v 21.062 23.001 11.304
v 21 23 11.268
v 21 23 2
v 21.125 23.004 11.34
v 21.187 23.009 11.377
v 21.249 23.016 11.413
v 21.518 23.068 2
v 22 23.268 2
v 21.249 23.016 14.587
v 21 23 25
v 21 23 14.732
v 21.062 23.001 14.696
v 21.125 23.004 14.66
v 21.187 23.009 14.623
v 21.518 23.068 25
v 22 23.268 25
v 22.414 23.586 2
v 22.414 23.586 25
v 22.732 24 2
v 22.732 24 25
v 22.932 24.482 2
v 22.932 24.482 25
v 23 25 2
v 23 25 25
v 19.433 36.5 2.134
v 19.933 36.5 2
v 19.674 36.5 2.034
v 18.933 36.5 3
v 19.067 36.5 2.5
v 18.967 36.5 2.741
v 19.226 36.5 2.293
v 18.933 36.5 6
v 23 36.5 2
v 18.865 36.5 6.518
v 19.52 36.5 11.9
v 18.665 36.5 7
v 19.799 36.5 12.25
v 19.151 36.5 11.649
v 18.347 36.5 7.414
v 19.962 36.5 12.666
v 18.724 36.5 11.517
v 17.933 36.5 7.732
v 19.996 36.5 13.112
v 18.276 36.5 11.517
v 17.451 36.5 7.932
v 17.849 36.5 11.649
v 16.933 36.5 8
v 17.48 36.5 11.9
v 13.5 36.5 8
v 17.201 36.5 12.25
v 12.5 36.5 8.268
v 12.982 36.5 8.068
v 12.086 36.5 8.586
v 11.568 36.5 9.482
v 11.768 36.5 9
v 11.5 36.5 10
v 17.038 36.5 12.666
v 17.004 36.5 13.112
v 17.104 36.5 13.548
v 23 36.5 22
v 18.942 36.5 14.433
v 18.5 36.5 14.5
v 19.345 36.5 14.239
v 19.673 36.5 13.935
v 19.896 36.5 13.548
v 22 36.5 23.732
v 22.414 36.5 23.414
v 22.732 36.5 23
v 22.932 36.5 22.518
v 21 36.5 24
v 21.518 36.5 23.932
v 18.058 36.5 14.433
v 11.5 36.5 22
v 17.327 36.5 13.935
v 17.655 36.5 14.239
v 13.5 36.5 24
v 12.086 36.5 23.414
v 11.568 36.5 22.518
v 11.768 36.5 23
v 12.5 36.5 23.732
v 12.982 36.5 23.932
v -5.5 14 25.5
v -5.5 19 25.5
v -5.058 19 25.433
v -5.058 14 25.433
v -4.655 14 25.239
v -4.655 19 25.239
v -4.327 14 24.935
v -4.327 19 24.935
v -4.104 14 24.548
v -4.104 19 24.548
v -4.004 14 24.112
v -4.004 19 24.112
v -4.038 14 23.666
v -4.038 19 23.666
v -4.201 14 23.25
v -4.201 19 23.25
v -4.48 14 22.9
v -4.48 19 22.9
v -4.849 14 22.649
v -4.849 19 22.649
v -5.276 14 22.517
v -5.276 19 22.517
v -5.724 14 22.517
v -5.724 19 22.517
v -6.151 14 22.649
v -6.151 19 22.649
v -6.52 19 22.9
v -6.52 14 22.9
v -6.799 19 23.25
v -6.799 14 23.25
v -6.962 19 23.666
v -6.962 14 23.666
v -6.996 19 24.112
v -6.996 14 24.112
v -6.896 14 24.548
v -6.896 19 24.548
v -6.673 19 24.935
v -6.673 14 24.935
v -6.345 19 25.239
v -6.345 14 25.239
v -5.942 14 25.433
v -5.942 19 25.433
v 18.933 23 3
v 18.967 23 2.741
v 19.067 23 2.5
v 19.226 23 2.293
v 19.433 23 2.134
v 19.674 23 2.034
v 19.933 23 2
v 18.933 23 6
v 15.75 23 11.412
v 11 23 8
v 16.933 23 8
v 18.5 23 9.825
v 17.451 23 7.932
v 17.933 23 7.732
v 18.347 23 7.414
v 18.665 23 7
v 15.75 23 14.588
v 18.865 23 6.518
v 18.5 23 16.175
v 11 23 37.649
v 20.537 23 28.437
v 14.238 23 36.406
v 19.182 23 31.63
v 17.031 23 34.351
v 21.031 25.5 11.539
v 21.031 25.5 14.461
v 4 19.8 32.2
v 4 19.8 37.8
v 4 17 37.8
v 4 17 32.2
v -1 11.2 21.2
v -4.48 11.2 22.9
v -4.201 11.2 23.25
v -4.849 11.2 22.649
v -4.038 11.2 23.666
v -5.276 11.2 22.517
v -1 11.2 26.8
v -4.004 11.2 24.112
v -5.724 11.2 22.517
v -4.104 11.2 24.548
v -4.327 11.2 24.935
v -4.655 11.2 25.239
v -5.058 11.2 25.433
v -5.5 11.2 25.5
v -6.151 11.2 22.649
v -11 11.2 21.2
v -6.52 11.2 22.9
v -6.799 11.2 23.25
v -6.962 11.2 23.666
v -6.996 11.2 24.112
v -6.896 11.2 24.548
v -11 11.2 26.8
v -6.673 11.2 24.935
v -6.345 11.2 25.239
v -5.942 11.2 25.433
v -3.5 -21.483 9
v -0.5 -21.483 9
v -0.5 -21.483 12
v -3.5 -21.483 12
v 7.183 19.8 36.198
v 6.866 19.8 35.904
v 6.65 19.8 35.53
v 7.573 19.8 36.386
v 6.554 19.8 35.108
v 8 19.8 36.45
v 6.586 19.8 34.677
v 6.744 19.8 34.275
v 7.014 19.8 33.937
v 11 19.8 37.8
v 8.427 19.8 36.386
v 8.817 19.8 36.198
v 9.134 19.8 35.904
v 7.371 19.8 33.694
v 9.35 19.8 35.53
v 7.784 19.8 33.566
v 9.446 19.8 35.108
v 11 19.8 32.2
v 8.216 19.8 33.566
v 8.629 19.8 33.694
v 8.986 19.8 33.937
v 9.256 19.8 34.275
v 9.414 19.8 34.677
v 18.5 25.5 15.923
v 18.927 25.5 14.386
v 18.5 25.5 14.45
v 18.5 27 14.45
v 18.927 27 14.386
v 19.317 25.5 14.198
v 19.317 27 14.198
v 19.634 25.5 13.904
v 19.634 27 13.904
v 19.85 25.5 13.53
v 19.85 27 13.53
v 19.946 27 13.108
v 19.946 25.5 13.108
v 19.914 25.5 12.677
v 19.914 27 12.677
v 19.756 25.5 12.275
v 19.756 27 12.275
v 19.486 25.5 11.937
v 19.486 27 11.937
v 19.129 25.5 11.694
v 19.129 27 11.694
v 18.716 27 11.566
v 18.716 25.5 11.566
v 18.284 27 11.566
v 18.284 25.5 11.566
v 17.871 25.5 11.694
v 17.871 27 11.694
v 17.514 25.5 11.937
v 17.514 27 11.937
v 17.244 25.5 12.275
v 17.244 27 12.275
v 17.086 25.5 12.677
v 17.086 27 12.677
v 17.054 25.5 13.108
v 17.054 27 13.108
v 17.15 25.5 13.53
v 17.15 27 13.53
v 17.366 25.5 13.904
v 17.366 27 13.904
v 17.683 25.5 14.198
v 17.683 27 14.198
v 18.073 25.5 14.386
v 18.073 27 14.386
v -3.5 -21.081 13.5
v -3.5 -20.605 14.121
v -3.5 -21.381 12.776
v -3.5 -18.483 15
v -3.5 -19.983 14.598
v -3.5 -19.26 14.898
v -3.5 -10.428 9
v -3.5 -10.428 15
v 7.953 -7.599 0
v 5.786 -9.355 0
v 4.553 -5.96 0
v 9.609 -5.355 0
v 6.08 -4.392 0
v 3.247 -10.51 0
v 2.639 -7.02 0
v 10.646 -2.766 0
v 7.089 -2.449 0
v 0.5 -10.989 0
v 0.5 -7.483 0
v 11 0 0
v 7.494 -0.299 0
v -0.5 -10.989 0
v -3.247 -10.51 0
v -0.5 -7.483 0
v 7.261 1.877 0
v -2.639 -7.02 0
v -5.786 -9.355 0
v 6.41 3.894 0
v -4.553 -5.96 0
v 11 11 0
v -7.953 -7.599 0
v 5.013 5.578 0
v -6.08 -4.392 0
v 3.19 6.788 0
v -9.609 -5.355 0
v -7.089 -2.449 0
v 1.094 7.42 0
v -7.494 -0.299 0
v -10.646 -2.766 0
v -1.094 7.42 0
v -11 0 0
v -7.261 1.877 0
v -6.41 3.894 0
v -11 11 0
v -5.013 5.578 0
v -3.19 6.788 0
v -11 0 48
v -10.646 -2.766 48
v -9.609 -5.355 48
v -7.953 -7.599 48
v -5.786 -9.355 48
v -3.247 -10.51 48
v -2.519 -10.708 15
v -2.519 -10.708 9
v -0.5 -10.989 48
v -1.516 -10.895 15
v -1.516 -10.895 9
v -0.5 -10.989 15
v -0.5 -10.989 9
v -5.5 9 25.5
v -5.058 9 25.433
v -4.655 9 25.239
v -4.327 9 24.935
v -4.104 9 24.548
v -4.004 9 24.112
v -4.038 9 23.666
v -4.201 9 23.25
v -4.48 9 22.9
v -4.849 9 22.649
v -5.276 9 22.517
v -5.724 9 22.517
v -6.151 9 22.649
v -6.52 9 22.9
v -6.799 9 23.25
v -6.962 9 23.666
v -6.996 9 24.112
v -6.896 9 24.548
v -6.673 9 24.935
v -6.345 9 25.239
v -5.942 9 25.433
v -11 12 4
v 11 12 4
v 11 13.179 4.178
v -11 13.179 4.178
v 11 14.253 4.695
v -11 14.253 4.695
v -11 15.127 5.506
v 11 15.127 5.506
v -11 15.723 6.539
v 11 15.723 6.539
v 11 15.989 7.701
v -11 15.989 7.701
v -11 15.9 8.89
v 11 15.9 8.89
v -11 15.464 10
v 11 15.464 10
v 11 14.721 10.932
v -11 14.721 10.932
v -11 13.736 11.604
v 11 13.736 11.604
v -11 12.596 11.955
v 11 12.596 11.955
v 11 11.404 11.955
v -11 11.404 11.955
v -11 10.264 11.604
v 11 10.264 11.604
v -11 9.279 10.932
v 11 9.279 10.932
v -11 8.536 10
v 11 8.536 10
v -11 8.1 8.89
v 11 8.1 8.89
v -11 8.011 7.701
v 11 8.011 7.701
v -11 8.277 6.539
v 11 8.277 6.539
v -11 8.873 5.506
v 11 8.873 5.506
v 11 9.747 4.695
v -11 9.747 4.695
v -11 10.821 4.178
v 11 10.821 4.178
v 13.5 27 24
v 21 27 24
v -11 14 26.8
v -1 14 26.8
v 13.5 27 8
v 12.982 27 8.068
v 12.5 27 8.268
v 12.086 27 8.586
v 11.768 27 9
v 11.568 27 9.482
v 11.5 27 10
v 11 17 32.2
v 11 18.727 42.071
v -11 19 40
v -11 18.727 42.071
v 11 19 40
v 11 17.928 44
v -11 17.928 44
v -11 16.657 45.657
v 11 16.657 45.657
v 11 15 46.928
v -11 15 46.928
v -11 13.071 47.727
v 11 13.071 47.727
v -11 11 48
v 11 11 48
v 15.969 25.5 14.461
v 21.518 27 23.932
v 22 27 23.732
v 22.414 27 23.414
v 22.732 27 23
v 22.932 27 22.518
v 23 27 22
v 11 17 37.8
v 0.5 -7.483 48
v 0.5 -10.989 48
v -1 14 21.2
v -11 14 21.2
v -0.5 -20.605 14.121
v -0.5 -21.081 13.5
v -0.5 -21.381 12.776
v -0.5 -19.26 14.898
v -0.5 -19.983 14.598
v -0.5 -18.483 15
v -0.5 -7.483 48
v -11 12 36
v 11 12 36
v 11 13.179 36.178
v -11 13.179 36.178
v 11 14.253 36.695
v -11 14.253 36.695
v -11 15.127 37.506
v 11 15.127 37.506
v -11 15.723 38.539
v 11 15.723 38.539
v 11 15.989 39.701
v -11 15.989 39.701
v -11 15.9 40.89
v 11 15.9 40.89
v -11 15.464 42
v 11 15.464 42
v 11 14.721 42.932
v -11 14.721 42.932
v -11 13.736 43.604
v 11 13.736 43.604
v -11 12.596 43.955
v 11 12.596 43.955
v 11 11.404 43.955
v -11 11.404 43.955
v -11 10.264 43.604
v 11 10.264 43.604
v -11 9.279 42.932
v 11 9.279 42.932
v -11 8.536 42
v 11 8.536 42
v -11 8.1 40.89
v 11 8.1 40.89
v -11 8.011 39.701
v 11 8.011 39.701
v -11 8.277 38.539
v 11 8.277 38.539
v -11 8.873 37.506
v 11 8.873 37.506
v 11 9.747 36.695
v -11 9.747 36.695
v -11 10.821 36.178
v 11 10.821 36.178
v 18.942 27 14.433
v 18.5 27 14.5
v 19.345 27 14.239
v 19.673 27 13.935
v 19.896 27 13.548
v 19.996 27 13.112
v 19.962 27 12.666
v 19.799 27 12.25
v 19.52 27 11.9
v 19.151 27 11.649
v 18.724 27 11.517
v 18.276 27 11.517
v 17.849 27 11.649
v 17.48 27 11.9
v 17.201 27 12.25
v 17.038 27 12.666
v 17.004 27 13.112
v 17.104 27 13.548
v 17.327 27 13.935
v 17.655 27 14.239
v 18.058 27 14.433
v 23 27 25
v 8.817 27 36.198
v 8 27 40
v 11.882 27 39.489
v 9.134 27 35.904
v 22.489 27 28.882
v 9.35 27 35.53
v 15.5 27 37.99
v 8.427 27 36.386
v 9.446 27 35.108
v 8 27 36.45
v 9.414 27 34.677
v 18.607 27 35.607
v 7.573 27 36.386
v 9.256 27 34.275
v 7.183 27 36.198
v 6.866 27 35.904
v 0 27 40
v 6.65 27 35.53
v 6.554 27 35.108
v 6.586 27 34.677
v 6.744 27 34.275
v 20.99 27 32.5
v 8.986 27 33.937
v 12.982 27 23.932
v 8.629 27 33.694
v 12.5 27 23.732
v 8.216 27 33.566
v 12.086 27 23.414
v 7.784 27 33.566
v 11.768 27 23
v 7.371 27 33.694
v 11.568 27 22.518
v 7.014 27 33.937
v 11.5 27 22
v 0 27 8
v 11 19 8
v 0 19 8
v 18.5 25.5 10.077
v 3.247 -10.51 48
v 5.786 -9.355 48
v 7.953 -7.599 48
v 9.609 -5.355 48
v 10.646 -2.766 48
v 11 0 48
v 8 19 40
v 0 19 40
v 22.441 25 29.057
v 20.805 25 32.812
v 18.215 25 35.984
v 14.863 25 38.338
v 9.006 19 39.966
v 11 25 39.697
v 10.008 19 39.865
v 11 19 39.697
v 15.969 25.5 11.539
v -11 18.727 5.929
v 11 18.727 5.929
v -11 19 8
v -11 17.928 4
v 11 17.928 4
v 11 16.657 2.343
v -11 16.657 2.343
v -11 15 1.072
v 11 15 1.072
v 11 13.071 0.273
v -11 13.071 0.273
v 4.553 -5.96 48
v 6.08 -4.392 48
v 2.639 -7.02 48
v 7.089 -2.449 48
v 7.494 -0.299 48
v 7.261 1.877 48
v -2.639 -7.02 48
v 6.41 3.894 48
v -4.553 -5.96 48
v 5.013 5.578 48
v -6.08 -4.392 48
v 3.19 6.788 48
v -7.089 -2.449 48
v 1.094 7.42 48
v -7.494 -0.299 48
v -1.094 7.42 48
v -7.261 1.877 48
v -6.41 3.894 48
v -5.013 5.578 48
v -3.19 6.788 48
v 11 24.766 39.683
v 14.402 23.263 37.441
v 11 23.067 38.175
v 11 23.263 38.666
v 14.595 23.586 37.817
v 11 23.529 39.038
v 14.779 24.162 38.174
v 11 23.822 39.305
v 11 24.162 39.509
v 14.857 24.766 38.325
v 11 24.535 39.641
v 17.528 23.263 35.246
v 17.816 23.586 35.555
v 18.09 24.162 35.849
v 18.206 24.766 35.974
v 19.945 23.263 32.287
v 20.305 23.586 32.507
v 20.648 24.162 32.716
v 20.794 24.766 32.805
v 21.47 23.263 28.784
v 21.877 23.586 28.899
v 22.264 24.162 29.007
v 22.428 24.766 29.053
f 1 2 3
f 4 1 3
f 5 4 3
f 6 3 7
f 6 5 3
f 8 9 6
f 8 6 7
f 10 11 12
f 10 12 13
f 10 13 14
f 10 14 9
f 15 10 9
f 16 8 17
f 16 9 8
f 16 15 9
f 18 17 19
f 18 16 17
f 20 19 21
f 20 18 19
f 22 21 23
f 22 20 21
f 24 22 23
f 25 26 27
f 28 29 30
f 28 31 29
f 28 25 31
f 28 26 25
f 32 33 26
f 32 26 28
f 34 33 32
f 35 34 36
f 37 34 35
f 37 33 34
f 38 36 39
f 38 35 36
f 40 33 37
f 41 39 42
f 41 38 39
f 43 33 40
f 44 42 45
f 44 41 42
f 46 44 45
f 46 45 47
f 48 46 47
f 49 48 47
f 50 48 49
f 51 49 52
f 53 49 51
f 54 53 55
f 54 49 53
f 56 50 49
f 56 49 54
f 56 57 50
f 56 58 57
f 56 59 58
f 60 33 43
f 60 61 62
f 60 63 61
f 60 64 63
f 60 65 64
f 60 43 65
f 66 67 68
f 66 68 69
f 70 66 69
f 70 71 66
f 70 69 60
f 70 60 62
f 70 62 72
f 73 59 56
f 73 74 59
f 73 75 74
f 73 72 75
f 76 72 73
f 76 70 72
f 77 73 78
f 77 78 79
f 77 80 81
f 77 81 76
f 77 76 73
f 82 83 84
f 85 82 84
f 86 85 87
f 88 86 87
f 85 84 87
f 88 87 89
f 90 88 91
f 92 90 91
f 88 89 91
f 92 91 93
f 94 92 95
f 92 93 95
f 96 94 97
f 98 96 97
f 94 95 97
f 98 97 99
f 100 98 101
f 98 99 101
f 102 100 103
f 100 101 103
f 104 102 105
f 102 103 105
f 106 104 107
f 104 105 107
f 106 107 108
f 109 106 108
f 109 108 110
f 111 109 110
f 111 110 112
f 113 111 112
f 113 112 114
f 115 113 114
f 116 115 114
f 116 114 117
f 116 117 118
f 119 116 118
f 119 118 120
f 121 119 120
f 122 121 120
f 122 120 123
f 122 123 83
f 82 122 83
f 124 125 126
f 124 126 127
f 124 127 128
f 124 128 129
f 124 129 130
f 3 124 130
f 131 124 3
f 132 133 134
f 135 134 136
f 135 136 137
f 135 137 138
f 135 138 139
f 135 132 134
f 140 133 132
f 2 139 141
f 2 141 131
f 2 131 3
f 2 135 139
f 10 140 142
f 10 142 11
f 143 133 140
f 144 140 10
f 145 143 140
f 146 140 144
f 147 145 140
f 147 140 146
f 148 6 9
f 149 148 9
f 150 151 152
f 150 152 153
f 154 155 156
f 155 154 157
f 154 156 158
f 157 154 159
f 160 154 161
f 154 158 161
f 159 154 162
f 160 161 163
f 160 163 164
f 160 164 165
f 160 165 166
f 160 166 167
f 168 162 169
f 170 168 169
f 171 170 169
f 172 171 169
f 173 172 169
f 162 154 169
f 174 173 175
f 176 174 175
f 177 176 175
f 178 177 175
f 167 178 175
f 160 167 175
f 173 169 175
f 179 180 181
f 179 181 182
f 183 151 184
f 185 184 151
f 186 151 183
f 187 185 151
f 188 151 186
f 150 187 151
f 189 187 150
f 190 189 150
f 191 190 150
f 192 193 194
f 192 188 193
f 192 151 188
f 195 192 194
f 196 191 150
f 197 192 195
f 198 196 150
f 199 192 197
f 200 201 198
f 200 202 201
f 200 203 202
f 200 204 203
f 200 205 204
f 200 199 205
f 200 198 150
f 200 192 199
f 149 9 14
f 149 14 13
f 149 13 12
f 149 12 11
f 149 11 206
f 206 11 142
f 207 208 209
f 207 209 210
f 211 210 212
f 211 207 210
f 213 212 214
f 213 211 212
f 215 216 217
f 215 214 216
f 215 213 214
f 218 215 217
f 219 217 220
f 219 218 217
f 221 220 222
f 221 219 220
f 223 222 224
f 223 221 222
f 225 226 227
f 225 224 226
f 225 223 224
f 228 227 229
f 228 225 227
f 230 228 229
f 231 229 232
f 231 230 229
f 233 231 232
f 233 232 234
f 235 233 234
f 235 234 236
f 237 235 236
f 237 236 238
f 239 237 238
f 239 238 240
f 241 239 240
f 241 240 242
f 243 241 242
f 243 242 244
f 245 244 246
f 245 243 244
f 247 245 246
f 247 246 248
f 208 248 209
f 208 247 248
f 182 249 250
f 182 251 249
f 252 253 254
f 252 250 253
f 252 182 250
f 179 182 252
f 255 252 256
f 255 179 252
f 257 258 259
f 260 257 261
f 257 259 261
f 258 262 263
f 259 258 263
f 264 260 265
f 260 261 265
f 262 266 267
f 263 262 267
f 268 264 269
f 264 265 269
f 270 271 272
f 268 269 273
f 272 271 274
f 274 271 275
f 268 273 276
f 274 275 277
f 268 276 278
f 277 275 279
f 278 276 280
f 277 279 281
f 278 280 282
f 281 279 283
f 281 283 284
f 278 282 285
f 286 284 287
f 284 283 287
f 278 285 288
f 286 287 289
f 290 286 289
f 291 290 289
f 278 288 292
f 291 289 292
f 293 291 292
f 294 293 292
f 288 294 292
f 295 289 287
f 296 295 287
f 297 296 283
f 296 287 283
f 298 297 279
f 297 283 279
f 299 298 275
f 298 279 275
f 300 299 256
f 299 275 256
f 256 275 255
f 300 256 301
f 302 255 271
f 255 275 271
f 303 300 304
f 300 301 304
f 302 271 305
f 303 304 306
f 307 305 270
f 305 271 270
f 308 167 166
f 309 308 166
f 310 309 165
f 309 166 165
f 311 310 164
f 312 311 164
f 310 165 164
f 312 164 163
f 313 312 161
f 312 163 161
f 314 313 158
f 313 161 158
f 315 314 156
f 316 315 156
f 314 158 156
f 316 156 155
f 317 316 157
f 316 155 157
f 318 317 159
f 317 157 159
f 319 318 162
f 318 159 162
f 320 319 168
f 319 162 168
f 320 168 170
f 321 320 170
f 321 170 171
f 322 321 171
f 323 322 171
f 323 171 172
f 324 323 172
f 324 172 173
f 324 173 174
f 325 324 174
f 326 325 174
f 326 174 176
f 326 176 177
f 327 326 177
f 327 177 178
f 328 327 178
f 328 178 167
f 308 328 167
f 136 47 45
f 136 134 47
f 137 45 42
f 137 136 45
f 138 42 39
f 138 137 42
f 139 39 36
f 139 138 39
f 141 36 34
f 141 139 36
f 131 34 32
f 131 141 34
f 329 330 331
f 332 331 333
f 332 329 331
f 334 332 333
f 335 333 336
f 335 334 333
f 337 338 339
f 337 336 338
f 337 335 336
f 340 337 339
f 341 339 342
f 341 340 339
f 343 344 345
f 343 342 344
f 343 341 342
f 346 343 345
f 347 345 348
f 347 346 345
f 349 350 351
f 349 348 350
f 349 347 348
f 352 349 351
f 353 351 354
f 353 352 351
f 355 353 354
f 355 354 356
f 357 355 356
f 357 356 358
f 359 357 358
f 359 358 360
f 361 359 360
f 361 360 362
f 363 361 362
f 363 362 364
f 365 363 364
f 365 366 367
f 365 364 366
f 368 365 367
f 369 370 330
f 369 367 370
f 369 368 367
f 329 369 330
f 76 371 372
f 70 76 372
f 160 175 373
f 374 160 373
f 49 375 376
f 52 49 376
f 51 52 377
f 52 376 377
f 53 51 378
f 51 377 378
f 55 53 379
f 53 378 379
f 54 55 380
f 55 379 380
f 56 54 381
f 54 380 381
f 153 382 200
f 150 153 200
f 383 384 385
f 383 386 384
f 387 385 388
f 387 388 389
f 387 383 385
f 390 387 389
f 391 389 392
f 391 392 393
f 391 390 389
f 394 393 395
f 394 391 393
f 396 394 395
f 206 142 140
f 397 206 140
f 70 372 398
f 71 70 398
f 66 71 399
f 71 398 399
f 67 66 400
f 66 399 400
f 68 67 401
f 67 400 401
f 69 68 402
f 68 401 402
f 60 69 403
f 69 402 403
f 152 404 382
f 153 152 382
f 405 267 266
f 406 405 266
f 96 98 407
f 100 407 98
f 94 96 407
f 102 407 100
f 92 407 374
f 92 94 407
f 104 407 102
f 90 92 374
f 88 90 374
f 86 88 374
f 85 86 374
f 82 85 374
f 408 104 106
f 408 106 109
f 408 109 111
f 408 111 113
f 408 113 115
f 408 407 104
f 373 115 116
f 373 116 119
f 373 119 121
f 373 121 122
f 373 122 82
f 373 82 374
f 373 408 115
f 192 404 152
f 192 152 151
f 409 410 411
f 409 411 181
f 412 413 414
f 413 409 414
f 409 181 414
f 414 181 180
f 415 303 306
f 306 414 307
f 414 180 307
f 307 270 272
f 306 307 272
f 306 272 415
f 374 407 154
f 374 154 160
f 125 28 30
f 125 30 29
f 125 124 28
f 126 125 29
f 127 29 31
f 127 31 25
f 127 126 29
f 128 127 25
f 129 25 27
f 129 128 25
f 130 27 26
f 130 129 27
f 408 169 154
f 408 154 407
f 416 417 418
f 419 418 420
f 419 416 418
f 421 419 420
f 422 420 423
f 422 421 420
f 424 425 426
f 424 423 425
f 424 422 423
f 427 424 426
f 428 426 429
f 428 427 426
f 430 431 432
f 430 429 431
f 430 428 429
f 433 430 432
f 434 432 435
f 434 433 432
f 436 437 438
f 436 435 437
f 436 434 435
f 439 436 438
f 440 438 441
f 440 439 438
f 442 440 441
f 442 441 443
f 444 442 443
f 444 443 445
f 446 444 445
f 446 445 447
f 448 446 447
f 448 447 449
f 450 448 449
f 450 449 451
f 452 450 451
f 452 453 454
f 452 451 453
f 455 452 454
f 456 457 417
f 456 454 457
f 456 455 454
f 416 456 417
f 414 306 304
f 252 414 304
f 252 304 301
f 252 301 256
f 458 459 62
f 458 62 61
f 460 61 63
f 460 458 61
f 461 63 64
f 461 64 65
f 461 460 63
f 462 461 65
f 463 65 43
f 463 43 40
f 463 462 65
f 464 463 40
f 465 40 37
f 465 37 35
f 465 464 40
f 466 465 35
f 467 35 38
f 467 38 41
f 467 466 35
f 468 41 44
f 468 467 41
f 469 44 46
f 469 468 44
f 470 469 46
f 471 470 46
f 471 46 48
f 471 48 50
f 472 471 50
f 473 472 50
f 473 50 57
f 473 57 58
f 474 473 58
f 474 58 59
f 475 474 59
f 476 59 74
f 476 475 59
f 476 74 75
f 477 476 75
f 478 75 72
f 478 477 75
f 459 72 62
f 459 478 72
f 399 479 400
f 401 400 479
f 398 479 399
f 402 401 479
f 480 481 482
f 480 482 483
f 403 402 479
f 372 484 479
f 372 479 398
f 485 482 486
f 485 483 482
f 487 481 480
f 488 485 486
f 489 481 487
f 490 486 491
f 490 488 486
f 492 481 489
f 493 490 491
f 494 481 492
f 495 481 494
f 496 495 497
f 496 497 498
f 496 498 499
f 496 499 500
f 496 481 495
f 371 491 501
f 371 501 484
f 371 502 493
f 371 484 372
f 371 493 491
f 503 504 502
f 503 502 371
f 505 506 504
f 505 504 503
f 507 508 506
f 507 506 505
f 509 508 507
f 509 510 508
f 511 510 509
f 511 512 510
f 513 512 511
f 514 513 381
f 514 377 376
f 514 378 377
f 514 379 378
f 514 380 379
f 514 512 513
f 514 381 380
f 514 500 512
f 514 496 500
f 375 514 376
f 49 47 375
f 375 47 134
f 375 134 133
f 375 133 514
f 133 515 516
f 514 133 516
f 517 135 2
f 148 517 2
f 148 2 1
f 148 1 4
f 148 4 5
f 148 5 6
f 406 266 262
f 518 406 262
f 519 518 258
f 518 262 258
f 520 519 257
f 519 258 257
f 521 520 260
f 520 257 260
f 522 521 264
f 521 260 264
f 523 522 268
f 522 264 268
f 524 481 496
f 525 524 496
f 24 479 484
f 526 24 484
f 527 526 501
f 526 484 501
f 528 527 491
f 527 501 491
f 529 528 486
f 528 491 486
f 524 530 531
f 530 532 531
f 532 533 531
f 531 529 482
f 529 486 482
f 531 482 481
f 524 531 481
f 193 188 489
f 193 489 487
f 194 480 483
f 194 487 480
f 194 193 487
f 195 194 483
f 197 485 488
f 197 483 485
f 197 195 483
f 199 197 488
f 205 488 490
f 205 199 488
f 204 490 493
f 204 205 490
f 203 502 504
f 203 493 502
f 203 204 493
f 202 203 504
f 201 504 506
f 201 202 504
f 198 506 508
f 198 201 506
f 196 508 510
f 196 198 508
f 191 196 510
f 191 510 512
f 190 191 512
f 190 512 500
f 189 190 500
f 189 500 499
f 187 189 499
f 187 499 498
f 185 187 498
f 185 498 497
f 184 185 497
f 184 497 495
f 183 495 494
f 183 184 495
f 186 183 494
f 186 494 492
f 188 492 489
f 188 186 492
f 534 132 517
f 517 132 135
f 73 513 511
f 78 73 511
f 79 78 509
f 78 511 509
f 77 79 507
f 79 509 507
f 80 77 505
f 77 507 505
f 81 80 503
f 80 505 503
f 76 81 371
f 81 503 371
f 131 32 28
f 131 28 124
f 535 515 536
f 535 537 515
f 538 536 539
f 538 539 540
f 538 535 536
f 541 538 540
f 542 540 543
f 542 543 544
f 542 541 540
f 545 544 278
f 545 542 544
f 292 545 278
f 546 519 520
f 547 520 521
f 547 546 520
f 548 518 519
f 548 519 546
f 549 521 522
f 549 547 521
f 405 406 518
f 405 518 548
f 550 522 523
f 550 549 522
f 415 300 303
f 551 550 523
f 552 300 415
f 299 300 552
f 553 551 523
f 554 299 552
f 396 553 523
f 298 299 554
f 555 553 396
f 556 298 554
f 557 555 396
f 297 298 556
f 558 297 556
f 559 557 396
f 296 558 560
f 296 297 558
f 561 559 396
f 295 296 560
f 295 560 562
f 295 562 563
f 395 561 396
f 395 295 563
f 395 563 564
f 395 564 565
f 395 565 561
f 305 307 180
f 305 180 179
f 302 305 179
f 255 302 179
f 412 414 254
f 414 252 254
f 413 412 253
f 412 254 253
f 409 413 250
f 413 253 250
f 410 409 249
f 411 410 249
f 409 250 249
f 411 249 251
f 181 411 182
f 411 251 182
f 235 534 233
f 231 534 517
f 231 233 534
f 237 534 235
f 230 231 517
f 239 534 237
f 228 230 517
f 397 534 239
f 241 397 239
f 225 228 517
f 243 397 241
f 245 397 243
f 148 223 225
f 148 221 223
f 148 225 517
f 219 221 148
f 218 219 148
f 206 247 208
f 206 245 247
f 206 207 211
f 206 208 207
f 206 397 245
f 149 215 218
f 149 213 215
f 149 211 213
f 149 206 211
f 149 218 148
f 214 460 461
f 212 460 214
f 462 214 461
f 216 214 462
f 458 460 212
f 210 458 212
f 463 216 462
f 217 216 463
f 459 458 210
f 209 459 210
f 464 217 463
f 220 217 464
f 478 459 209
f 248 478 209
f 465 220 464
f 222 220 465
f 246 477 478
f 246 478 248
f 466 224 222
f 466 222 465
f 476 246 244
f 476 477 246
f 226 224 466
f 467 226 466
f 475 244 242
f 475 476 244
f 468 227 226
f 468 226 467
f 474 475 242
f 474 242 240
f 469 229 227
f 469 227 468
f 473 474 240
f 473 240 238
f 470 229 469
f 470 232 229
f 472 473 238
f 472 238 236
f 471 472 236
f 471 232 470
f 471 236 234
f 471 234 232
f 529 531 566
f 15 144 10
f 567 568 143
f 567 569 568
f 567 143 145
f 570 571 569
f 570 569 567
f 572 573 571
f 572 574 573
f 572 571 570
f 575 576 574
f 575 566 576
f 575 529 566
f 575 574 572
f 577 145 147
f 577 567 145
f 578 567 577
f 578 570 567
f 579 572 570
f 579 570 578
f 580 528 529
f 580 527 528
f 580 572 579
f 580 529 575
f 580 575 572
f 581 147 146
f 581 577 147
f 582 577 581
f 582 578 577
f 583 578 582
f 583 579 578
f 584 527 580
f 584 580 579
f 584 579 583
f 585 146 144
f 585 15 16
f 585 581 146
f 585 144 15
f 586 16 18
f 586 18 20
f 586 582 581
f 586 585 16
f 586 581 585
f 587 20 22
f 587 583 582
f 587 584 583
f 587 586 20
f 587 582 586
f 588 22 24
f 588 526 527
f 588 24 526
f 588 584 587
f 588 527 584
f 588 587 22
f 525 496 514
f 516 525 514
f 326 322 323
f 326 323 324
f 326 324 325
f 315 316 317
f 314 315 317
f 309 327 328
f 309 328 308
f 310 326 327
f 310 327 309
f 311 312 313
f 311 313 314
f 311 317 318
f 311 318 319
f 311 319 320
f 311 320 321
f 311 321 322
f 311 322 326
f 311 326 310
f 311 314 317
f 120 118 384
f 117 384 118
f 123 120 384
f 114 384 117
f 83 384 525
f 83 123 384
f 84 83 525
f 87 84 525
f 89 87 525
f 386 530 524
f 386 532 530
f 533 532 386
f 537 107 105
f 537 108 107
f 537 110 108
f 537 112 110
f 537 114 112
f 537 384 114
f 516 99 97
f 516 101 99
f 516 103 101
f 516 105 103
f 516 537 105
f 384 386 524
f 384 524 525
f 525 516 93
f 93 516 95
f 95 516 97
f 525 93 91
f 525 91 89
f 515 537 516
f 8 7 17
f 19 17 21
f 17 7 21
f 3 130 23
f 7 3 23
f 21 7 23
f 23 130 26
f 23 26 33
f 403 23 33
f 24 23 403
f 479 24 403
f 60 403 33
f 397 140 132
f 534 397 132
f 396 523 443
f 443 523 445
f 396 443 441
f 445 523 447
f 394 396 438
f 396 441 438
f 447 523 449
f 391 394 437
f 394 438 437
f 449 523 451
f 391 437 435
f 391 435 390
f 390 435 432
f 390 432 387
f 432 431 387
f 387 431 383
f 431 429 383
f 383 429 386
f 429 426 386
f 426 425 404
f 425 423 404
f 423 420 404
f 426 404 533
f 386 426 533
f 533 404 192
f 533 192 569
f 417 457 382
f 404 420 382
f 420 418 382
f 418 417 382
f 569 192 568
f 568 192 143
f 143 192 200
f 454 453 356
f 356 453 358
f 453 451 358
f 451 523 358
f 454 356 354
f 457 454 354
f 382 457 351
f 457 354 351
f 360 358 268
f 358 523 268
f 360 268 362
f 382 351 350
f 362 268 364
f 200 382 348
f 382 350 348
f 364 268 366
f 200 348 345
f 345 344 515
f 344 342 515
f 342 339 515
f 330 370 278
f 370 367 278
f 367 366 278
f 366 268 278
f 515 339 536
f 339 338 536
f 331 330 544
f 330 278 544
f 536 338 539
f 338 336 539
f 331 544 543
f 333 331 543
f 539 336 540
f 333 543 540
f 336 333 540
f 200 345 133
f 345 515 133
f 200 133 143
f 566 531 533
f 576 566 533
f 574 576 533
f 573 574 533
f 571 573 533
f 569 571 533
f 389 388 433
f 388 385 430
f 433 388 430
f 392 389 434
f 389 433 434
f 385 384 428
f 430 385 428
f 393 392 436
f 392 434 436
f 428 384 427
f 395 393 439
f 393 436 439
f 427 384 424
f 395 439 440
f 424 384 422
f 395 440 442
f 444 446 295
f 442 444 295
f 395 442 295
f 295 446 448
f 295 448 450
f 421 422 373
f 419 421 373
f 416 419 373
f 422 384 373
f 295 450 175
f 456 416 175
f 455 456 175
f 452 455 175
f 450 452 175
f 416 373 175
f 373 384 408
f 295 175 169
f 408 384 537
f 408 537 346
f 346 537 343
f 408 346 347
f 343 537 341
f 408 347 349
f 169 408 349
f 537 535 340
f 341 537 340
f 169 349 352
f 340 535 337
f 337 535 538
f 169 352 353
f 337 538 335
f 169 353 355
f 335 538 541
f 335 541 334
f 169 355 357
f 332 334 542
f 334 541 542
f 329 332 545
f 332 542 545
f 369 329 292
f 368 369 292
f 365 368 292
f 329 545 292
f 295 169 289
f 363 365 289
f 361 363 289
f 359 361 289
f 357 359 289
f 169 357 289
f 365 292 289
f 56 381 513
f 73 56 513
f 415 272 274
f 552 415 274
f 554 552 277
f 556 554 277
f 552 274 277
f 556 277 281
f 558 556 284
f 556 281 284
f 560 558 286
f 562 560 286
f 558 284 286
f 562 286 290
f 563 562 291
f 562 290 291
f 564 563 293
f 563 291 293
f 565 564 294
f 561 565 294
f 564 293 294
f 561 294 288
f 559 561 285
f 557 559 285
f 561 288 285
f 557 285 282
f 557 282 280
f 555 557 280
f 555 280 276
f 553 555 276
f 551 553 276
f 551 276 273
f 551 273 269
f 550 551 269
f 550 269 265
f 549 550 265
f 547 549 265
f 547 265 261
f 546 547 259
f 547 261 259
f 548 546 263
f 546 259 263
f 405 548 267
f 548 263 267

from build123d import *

# Parameters (mm, degrees)
EXTRUDE_1_DEPTH          = 48
CUT_EXTRUDE_1_DEPTH      = 60.304300013
CUT_EXTRUDE_1_DEPTH_BACK = 60.304300013
SKETCH_3_R               = 4
CUT_EXTRUDE_2_DEPTH      = 60.304300013
CUT_EXTRUDE_2_DEPTH_BACK = 60.304300013
SKETCH_4_R               = 4
SKETCH_5_W               = 48
SKETCH_5_H               = 4
EXTRUDE_3_DEPTH          = 12
CUT_EXTRUDE_3_DEPTH      = 66.39217114
CUT_EXTRUDE_3_DEPTH_BACK = 25
CUT_EXTRUDE_3_START      = 15
SKETCH_7_R               = 1.45
CUT_EXTRUDE_4_DEPTH      = 66.39217114
CUT_EXTRUDE_4_DEPTH_BACK = 66.39217114
CUT_EXTRUDE_5_DEPTH      = 8
SKETCH_10_R              = 1.5
CUT_EXTRUDE_6_DEPTH      = 10
SKETCH_11_W              = 5.6
SKETCH_11_H              = 2.8
CUT_EXTRUDE_7_DEPTH      = 10
SKETCH_13_R              = 1.5
EXTRUDE_4_DEPTH          = 9.5
FILLET_2_R               = 15
FILLET_4_R               = 8
FILLET_5_R               = 2
EXTRUDE_5_DEPTH          = 6
FILLET_6_R               = 2
FILLET_7_R               = 1
EXTRUDE_START            = -9
SKETCH_15_W              = 3
SKETCH_15_H              = 14
EXTRUDE_6_DEPTH          = 6
FILLET_8_R               = 3
SKETCH_16_W              = 5.6
SKETCH_16_H              = 2.8
CUT_EXTRUDE_8_DEPTH      = 7
CUT_EXTRUDE_9_DEPTH      = 2.5
CUT_EXTRUDE_9_DRAFT      = -5


# Some blends are built 0.0001 mm under size
with BuildPart() as part:
    # Эскиз2 → Бобышка-Вытянуть1 (new body)
    with BuildSketch(Plane.XY):
        with BuildLine():
            Line((0.5, -7.483314774), (0.5, -10.988630488))
            ThreePointArc((0.5, -10.988630488), (7.95298686, -7.599342077), (11, 0))
            Line((11, 0), (11, 27))
            Line((11, 27), (-11, 27))
            Line((-11, 27), (-11, 0))
            ThreePointArc((-11, 0), (-7.95298686, -7.599342077), (-0.5, -10.988630488))
            Line((-0.5, -10.988630488), (-0.5, -7.483314774))
            ThreePointArc((-0.5, -7.483314774), (0, 7.5), (0.5, -7.483314774))
        make_face()
    extrude(amount=EXTRUDE_1_DEPTH)

    # Эскиз3 → Вырез-Вытянуть1 (cut, two sides: drawn at the far end of the back side and taken through both)
    with BuildSketch(Plane(origin=(11, 0, 0), x_dir=(0, 0, -1), z_dir=(1, 0, 0)).offset(-CUT_EXTRUDE_1_DEPTH_BACK)):
        with Locations((-40, 12)):
            Circle(SKETCH_3_R)
    extrude(amount=CUT_EXTRUDE_1_DEPTH + CUT_EXTRUDE_1_DEPTH_BACK, mode=Mode.SUBTRACT)

    # Эскиз4 → Вырез-Вытянуть2 (cut, two sides: drawn at the far end of the back side and taken through both)
    with BuildSketch(Plane(origin=(11, 0, 0), x_dir=(0, 0, -1), z_dir=(1, 0, 0)).offset(-CUT_EXTRUDE_2_DEPTH_BACK)):
        with Locations((-8, 12)):
            Circle(SKETCH_4_R)
    extrude(amount=CUT_EXTRUDE_2_DEPTH + CUT_EXTRUDE_2_DEPTH_BACK, mode=Mode.SUBTRACT)

    # Эскиз5 → Бобышка-Вытянуть3 (add)
    with BuildSketch(Plane(origin=(11, 0, 0), x_dir=(0, 0, -1), z_dir=(1, 0, 0))):
        with Locations((-24, 25)):
            Rectangle(SKETCH_5_W, SKETCH_5_H)
    extrude(amount=EXTRUDE_3_DEPTH)

    # Эскиз7 → Вырез-Вытянуть3 (cut, two sides: drawn at the far end of the back side and taken through both)
    with BuildSketch(Plane(origin=(0, 27, 0), x_dir=(1, 0, 0), z_dir=(0, 1, 0)).offset(CUT_EXTRUDE_3_START - CUT_EXTRUDE_3_DEPTH_BACK)):
        with Locations(Location((8, -35, 0), (0, 0, 270))):
            Circle(SKETCH_7_R)
        with Locations(Location((18.5, -13, 0), (0, 0, 270))):
            Circle(SKETCH_7_R)
    extrude(amount=CUT_EXTRUDE_3_DEPTH + CUT_EXTRUDE_3_DEPTH_BACK, mode=Mode.SUBTRACT)

    # Эскиз8 → Вырез-Вытянуть4 (cut, two sides: drawn at the far end of the back side and taken through both)
    with BuildSketch(Plane(origin=(0, 27, 0), x_dir=(1, 0, 0), z_dir=(0, 1, 0)).offset(-CUT_EXTRUDE_4_DEPTH_BACK)):
        with BuildLine():
            Line((23, -48), (20, -48))
            ThreePointArc((20, -48), (22.121320344, -47.121320344), (23, -45))
            Line((23, -45), (23, -48))
        make_face()
        with BuildLine():
            Line((23, 0), (23, -3))
            ThreePointArc((23, -3), (22.121320344, -0.878679656), (20, 0))
            Line((20, 0), (23, 0))
        make_face()
    extrude(amount=CUT_EXTRUDE_4_DEPTH + CUT_EXTRUDE_4_DEPTH_BACK, mode=Mode.SUBTRACT)

    # Эскиз9 → Вырез-Вытянуть5 (cut)
    with BuildSketch(Plane(origin=(0, 27, 0), x_dir=(1, 0, 0), z_dir=(0, 1, 0))):
        Polygon((-11, -48), (23, -48), (23, -40), (0, -40), (0, -8), (23, -8), (23, 0), (-11, 0), (-11, -8), (-11, -40), align=None)
    extrude(amount=-CUT_EXTRUDE_5_DEPTH, mode=Mode.SUBTRACT)

    # Эскиз10 → Вырез-Вытянуть6 (cut)
    with BuildSketch(Plane(origin=(0, 19, 0), x_dir=(1, 0, 0), z_dir=(0, 1, 0))):
        with Locations(Location((-5.5, -24, 0), (0, 0, 270))):
            Circle(SKETCH_10_R)
    extrude(amount=-CUT_EXTRUDE_6_DEPTH, mode=Mode.SUBTRACT)

    # Эскиз11 → Вырез-Вытянуть7 (cut)
    with BuildSketch(Plane.ZY.offset(11)):
        with Locations((24, 12.6)):
            Rectangle(SKETCH_11_W, SKETCH_11_H)
    extrude(amount=-CUT_EXTRUDE_7_DEPTH, mode=Mode.SUBTRACT)

    # Эскиз13 → Бобышка-Вытянуть4 (add)
    with BuildSketch(Plane(origin=(0, 27, 0), x_dir=(1, 0, 0), z_dir=(0, 1, 0))):
        with BuildLine():
            Line((21, -8), (13.5, -8))
            ThreePointArc((13.5, -8), (12.085786438, -8.585786438), (11.5, -10))
            Line((11.5, -10), (11.5, -22))
            ThreePointArc((11.5, -22), (12.085786438, -23.414213562), (13.5, -24))
            Line((13.5, -24), (21, -24))
            ThreePointArc((21, -24), (22.414213562, -23.414213562), (23, -22))
            Line((23, -22), (23, -10))
            Line((23, -10), (23, -8))
            Line((23, -8), (21, -8))
        make_face()
        with Locations(Location((18.5, -13, 0), (0, 0, 270))):
            Circle(SKETCH_13_R, mode=Mode.SUBTRACT)
    extrude(amount=EXTRUDE_4_DEPTH)

    # Скругление2
    # the kernel refuses this fillet: 15 mm, written as the material it takes off along each edge
    with BuildSketch(Plane(origin=(23, 64.5, 40), x_dir=(-1, 0, 0), z_dir=(0, -1, 0))) as fillet_2_piece_1_section:
        with BuildLine():
            CenterArc((FILLET_2_R, FILLET_2_R), FILLET_2_R, 180, 90)
            Line((0, FILLET_2_R), (0, 0))
            Line((0, 0), (FILLET_2_R, 0))
        make_face()
    fillet_2_piece_1 = extrude(amount=79, mode=Mode.PRIVATE)
    fillet_2_piece_1 = split(fillet_2_piece_1, bisect_by=Plane(origin=(10.251523637, 19, 39.909241185), z_dir=(0, 1, 0)), keep=Keep.TOP, mode=Mode.PRIVATE)
    add(fillet_2_piece_1, mode=Mode.SUBTRACT)

    # Скругление4
    fillet_4_edges = [part.edges().sort_by_distance(p)[0] for p in [
        (0, 19, 48),
        (0, 19, 0),
    ]]
    fillet(fillet_4_edges, radius=FILLET_4_R - 0.0001)  # a hair under: the kernel refuses the full size

    # Скругление5
    fillet_5_edges = [part.edges().sort_by_distance(p)[0] for p in [
        (23, 23, 16.5),
        (19.618950039, 23, 34.486832981),
    ]]
    fillet(fillet_5_edges, radius=FILLET_5_R)

    # Эскиз14 → Бобышка-Вытянуть5 (add)
    with BuildSketch(Plane(origin=(0, 0, 8), x_dir=(-1, 0, 0), z_dir=(0, 0, -1))):
        with BuildLine():
            Line((-23, 36.5), (-18.933112149, 36.5))
            Line((-18.933112149, 36.5), (-18.933112149, 23))
            Line((-18.933112149, 23), (-21, 23))
            ThreePointArc((-21, 23), (-22.414213562, 23.585786438), (-23, 25))
            Line((-23, 25), (-23, 36.5))
        make_face()
    extrude(amount=EXTRUDE_5_DEPTH)

    # Скругление6
    fillet_6_edges = [part.edges().sort_by_distance(p)[0] for p in [
        (18.933112149, 29.75, 8),
    ]]
    fillet(fillet_6_edges, radius=FILLET_6_R)

    # Скругление7
    fillet_7_edges = [part.edges().sort_by_distance(p)[0] for p in [
        (18.933112149, 29.75, 2),
    ]]
    fillet(fillet_7_edges, radius=FILLET_7_R)

    # Эскиз15 → Бобышка-Вытянуть6 (add)
    with BuildSketch(Plane(origin=(0, 0, 0), x_dir=(-1, 0, 0), z_dir=(0, 0, -1)).offset(EXTRUDE_START)):
        with Locations((2, -14.483314774)):
            Rectangle(SKETCH_15_W, SKETCH_15_H)
    extrude(amount=-EXTRUDE_6_DEPTH)

    # Скругление8
    fillet_8_edges = [part.edges().sort_by_distance(p)[0] for p in [
        (-2, -21.483314774, 15),
    ]]
    fillet(fillet_8_edges, radius=FILLET_8_R)

    # Эскиз16 → Вырез-Вытянуть8 (cut)
    with BuildSketch(Plane(origin=(11, 0, 0), x_dir=(0, 0, -1), z_dir=(1, 0, 0))):
        with Locations((-35, 18.4)):
            Rectangle(SKETCH_16_W, SKETCH_16_H)
    extrude(amount=-CUT_EXTRUDE_8_DEPTH, mode=Mode.SUBTRACT)


with BuildPart() as cut_extrude_9_tool:
    # Эскиз19 → Вырез-Вытянуть9 (with draft: the straight prism first)
    with BuildSketch(Plane.XZ.offset(-23)):
        Polygon((18.5, 16.175426481), (15.75, 14.58771324), (15.75, 11.41228676), (18.5, 9.824573519), (21.25, 11.41228676), (21.25, 14.58771324), align=None)
    extrude(amount=-CUT_EXTRUDE_9_DEPTH)
    # Вырез-Вытянуть9: the draft: its side faces are tilted about the plane it starts from
    cut_extrude_9_sides = [cut_extrude_9_tool.faces().sort_by_distance(p)[0] for p in [
        (17.125, 24.25, 15.38156986),
        (15.75, 24.25, 13),
        (17.125, 24.25, 10.61843014),
        (19.875, 24.25, 10.61843014),
        (21.25, 24.25, 13),
        (19.875, 24.25, 15.38156986),
    ]]
    draft(cut_extrude_9_sides, Plane.XZ.offset(-23), CUT_EXTRUDE_9_DRAFT)


with BuildPart() as part_1:
    add(part.part)

    # Вырез-Вытянуть9: cut by cut_extrude_9_tool
    add(cut_extrude_9_tool.part, mode=Mode.SUBTRACT)


solid = part_1.part
